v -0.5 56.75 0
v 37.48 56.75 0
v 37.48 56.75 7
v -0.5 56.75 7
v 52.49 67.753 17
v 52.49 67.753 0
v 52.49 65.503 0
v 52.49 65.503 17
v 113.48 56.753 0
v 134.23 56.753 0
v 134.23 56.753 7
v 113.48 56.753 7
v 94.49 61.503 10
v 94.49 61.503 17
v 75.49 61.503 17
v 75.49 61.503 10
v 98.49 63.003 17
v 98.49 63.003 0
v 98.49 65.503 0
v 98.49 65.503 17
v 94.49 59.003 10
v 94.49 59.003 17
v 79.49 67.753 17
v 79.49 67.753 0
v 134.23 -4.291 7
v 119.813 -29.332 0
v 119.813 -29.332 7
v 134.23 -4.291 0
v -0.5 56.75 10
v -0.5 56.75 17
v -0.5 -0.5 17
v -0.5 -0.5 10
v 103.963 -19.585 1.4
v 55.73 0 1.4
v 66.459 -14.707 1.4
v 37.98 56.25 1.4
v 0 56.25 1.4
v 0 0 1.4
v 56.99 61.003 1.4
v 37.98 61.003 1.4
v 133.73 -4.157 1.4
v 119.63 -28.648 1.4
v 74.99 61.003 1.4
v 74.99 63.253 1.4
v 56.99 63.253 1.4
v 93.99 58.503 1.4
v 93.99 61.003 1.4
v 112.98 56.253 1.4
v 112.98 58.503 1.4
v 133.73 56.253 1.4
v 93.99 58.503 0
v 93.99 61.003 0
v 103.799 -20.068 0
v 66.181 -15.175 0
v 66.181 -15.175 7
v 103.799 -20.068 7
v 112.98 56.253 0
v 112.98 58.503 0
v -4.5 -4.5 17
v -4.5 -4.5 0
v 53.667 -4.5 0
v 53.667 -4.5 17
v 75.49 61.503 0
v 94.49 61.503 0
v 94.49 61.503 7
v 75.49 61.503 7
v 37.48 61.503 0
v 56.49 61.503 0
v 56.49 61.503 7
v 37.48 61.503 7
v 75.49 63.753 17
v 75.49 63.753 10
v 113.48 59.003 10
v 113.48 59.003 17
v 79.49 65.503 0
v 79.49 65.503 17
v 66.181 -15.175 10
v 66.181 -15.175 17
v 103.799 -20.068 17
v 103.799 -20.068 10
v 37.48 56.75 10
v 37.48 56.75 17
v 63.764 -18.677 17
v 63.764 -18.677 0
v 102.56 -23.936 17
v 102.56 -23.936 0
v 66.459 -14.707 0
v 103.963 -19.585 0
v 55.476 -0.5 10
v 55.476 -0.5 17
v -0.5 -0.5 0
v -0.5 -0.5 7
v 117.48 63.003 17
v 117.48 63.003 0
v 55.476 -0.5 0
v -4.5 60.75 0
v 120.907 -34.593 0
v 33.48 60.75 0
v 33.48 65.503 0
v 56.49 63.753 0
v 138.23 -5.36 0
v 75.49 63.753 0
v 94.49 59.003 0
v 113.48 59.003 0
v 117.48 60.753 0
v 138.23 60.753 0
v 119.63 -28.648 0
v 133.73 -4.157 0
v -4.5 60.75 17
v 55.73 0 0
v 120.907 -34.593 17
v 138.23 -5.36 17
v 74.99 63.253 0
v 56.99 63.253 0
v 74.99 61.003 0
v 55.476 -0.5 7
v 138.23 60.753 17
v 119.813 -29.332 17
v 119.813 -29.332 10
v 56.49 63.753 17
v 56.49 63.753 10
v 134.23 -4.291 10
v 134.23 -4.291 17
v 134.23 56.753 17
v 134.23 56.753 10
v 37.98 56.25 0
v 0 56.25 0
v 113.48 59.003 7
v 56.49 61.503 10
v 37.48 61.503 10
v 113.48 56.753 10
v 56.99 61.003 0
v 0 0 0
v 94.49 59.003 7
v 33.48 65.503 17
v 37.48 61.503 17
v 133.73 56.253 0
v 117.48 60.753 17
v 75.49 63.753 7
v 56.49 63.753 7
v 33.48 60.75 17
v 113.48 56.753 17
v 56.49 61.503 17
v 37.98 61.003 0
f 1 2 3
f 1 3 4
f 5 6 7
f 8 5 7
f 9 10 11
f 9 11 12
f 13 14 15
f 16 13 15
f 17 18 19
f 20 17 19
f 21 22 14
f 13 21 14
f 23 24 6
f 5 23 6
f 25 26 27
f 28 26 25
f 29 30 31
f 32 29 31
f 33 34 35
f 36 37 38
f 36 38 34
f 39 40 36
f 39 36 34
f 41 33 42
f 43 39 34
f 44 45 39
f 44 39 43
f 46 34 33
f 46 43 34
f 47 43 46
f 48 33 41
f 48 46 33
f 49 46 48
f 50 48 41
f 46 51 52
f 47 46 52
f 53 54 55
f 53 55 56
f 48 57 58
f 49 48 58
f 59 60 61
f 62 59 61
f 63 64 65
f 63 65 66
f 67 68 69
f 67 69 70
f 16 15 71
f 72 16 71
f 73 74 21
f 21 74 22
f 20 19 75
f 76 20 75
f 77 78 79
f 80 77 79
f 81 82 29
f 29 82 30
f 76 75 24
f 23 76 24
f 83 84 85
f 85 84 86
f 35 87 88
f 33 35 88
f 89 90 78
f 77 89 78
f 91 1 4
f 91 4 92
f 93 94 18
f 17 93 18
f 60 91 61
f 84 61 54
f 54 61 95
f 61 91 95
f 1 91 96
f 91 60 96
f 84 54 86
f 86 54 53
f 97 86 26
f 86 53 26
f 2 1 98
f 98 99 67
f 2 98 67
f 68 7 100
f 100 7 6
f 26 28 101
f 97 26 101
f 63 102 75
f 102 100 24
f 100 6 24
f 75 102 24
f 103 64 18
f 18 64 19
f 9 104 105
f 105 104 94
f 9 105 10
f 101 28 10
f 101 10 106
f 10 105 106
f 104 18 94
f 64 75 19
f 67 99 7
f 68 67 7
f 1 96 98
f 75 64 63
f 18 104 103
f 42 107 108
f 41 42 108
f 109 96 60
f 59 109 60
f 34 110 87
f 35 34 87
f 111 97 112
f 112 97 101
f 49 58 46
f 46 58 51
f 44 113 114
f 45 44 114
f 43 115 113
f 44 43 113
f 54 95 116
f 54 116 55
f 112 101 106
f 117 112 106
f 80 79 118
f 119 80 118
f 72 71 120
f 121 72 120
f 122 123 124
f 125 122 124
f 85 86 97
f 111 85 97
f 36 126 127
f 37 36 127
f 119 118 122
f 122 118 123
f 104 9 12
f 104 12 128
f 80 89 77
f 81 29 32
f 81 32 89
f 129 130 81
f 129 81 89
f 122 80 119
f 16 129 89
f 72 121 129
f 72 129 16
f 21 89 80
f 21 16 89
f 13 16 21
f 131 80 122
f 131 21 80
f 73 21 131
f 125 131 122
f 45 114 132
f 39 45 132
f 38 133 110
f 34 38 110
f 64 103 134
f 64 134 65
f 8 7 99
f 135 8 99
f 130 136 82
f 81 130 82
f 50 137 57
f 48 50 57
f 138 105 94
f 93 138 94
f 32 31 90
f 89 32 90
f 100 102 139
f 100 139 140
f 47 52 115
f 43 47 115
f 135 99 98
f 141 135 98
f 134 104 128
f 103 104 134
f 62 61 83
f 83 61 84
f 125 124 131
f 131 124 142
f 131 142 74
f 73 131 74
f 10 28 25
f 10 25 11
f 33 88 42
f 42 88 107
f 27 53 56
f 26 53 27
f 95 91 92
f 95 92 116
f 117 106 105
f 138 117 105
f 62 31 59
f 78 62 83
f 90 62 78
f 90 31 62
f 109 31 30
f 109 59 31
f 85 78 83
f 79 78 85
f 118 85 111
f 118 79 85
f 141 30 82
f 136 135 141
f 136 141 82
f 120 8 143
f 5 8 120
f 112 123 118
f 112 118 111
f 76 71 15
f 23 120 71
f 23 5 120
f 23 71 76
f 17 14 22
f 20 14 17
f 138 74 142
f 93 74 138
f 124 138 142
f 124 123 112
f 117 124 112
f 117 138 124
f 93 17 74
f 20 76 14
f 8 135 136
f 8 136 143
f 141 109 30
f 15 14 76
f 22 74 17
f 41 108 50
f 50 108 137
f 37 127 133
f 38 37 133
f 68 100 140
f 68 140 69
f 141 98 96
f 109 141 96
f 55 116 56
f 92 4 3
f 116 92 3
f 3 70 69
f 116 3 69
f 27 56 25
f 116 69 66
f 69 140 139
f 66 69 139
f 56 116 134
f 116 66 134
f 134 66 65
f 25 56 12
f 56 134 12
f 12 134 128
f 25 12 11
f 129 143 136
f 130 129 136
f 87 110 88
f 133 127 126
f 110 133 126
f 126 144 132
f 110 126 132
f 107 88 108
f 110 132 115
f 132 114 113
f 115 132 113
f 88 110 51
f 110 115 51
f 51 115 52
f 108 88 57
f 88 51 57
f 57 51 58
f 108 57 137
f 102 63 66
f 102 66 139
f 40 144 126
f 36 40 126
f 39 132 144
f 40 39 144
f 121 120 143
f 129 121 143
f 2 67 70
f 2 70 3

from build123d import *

# Parameters (mm, degrees)
PAD_DEPTH       = 1.4
PAD002_DEPTH    = 17
POCKET_DEPTH    = 7
POCKET001_DEPTH = 7


with BuildPart() as pcb:
    # MirroredSketch017 → Pad (new body)
    with BuildSketch(Plane.XY):
        Polygon((0, 56.25), (0, 0), (55.73, 0), (66.458602, -14.707193), (103.962755, -19.584789), (119.629911, -28.648464), (133.73, -4.157341), (133.73, 56.252659), (112.98, 56.252659), (112.98, 58.502659), (93.99, 58.502659), (93.99, 61.002659), (74.99, 61.002659), (74.99, 63.252659), (56.99, 63.252659), (56.99, 61.002659), (37.98, 61.002659), (37.98, 56.25), align=None)
    extrude(amount=PAD_DEPTH)


with BuildPart() as body:
    # Sketch007 → Pad002 (new body)
    with BuildSketch(Plane.XY):
        Polygon((-4.5, 60.75), (-4.5, -4.5), (53.666937, -4.5), (63.764495, -18.67718), (102.559627, -23.936278), (120.9071, -34.593338), (138.23, -5.360167), (138.23, 60.752659), (117.48, 60.752659), (117.48, 63.002659), (98.49, 63.002659), (98.49, 65.502659), (79.49, 65.502659), (79.49, 67.752659), (52.49, 67.752659), (52.49, 65.502659), (33.48, 65.502659), (33.48, 60.75), align=None)
    extrude(amount=PAD002_DEPTH)

    # Sketch006 → Pocket (cut)
    with BuildSketch(Plane.XY.offset(17)):
        Polygon((-0.5, 56.75), (-0.5, -0.5), (55.475842, -0.5), (66.181197, -15.175326), (103.799015, -20.067704), (119.813235, -29.332161), (134.23, -4.290989), (134.23, 56.752659), (113.48, 56.752659), (113.48, 59.002659), (94.49, 59.002659), (94.49, 61.502659), (75.49, 61.502659), (75.49, 63.752659), (56.49, 63.752659), (56.49, 61.502659), (37.48, 61.502659), (37.48, 56.75), align=None)
    extrude(amount=-POCKET_DEPTH, mode=Mode.SUBTRACT)

    # Sketch008 → Pocket001 (cut)
    with BuildSketch(Plane.XY):
        Polygon((-0.5, 56.75), (-0.5, -0.5), (55.475842, -0.5), (66.181197, -15.175326), (103.799015, -20.067704), (119.813235, -29.332161), (134.23, -4.290989), (134.23, 56.752659), (113.48, 56.752659), (113.48, 59.002659), (94.49, 59.002659), (94.49, 61.502659), (75.49, 61.502659), (75.49, 63.752659), (56.49, 63.752659), (56.49, 61.502659), (37.48, 61.502659), (37.48, 56.75), align=None)
    extrude(amount=POCKET001_DEPTH, mode=Mode.SUBTRACT)


solid = Compound([pcb.part, body.part])
